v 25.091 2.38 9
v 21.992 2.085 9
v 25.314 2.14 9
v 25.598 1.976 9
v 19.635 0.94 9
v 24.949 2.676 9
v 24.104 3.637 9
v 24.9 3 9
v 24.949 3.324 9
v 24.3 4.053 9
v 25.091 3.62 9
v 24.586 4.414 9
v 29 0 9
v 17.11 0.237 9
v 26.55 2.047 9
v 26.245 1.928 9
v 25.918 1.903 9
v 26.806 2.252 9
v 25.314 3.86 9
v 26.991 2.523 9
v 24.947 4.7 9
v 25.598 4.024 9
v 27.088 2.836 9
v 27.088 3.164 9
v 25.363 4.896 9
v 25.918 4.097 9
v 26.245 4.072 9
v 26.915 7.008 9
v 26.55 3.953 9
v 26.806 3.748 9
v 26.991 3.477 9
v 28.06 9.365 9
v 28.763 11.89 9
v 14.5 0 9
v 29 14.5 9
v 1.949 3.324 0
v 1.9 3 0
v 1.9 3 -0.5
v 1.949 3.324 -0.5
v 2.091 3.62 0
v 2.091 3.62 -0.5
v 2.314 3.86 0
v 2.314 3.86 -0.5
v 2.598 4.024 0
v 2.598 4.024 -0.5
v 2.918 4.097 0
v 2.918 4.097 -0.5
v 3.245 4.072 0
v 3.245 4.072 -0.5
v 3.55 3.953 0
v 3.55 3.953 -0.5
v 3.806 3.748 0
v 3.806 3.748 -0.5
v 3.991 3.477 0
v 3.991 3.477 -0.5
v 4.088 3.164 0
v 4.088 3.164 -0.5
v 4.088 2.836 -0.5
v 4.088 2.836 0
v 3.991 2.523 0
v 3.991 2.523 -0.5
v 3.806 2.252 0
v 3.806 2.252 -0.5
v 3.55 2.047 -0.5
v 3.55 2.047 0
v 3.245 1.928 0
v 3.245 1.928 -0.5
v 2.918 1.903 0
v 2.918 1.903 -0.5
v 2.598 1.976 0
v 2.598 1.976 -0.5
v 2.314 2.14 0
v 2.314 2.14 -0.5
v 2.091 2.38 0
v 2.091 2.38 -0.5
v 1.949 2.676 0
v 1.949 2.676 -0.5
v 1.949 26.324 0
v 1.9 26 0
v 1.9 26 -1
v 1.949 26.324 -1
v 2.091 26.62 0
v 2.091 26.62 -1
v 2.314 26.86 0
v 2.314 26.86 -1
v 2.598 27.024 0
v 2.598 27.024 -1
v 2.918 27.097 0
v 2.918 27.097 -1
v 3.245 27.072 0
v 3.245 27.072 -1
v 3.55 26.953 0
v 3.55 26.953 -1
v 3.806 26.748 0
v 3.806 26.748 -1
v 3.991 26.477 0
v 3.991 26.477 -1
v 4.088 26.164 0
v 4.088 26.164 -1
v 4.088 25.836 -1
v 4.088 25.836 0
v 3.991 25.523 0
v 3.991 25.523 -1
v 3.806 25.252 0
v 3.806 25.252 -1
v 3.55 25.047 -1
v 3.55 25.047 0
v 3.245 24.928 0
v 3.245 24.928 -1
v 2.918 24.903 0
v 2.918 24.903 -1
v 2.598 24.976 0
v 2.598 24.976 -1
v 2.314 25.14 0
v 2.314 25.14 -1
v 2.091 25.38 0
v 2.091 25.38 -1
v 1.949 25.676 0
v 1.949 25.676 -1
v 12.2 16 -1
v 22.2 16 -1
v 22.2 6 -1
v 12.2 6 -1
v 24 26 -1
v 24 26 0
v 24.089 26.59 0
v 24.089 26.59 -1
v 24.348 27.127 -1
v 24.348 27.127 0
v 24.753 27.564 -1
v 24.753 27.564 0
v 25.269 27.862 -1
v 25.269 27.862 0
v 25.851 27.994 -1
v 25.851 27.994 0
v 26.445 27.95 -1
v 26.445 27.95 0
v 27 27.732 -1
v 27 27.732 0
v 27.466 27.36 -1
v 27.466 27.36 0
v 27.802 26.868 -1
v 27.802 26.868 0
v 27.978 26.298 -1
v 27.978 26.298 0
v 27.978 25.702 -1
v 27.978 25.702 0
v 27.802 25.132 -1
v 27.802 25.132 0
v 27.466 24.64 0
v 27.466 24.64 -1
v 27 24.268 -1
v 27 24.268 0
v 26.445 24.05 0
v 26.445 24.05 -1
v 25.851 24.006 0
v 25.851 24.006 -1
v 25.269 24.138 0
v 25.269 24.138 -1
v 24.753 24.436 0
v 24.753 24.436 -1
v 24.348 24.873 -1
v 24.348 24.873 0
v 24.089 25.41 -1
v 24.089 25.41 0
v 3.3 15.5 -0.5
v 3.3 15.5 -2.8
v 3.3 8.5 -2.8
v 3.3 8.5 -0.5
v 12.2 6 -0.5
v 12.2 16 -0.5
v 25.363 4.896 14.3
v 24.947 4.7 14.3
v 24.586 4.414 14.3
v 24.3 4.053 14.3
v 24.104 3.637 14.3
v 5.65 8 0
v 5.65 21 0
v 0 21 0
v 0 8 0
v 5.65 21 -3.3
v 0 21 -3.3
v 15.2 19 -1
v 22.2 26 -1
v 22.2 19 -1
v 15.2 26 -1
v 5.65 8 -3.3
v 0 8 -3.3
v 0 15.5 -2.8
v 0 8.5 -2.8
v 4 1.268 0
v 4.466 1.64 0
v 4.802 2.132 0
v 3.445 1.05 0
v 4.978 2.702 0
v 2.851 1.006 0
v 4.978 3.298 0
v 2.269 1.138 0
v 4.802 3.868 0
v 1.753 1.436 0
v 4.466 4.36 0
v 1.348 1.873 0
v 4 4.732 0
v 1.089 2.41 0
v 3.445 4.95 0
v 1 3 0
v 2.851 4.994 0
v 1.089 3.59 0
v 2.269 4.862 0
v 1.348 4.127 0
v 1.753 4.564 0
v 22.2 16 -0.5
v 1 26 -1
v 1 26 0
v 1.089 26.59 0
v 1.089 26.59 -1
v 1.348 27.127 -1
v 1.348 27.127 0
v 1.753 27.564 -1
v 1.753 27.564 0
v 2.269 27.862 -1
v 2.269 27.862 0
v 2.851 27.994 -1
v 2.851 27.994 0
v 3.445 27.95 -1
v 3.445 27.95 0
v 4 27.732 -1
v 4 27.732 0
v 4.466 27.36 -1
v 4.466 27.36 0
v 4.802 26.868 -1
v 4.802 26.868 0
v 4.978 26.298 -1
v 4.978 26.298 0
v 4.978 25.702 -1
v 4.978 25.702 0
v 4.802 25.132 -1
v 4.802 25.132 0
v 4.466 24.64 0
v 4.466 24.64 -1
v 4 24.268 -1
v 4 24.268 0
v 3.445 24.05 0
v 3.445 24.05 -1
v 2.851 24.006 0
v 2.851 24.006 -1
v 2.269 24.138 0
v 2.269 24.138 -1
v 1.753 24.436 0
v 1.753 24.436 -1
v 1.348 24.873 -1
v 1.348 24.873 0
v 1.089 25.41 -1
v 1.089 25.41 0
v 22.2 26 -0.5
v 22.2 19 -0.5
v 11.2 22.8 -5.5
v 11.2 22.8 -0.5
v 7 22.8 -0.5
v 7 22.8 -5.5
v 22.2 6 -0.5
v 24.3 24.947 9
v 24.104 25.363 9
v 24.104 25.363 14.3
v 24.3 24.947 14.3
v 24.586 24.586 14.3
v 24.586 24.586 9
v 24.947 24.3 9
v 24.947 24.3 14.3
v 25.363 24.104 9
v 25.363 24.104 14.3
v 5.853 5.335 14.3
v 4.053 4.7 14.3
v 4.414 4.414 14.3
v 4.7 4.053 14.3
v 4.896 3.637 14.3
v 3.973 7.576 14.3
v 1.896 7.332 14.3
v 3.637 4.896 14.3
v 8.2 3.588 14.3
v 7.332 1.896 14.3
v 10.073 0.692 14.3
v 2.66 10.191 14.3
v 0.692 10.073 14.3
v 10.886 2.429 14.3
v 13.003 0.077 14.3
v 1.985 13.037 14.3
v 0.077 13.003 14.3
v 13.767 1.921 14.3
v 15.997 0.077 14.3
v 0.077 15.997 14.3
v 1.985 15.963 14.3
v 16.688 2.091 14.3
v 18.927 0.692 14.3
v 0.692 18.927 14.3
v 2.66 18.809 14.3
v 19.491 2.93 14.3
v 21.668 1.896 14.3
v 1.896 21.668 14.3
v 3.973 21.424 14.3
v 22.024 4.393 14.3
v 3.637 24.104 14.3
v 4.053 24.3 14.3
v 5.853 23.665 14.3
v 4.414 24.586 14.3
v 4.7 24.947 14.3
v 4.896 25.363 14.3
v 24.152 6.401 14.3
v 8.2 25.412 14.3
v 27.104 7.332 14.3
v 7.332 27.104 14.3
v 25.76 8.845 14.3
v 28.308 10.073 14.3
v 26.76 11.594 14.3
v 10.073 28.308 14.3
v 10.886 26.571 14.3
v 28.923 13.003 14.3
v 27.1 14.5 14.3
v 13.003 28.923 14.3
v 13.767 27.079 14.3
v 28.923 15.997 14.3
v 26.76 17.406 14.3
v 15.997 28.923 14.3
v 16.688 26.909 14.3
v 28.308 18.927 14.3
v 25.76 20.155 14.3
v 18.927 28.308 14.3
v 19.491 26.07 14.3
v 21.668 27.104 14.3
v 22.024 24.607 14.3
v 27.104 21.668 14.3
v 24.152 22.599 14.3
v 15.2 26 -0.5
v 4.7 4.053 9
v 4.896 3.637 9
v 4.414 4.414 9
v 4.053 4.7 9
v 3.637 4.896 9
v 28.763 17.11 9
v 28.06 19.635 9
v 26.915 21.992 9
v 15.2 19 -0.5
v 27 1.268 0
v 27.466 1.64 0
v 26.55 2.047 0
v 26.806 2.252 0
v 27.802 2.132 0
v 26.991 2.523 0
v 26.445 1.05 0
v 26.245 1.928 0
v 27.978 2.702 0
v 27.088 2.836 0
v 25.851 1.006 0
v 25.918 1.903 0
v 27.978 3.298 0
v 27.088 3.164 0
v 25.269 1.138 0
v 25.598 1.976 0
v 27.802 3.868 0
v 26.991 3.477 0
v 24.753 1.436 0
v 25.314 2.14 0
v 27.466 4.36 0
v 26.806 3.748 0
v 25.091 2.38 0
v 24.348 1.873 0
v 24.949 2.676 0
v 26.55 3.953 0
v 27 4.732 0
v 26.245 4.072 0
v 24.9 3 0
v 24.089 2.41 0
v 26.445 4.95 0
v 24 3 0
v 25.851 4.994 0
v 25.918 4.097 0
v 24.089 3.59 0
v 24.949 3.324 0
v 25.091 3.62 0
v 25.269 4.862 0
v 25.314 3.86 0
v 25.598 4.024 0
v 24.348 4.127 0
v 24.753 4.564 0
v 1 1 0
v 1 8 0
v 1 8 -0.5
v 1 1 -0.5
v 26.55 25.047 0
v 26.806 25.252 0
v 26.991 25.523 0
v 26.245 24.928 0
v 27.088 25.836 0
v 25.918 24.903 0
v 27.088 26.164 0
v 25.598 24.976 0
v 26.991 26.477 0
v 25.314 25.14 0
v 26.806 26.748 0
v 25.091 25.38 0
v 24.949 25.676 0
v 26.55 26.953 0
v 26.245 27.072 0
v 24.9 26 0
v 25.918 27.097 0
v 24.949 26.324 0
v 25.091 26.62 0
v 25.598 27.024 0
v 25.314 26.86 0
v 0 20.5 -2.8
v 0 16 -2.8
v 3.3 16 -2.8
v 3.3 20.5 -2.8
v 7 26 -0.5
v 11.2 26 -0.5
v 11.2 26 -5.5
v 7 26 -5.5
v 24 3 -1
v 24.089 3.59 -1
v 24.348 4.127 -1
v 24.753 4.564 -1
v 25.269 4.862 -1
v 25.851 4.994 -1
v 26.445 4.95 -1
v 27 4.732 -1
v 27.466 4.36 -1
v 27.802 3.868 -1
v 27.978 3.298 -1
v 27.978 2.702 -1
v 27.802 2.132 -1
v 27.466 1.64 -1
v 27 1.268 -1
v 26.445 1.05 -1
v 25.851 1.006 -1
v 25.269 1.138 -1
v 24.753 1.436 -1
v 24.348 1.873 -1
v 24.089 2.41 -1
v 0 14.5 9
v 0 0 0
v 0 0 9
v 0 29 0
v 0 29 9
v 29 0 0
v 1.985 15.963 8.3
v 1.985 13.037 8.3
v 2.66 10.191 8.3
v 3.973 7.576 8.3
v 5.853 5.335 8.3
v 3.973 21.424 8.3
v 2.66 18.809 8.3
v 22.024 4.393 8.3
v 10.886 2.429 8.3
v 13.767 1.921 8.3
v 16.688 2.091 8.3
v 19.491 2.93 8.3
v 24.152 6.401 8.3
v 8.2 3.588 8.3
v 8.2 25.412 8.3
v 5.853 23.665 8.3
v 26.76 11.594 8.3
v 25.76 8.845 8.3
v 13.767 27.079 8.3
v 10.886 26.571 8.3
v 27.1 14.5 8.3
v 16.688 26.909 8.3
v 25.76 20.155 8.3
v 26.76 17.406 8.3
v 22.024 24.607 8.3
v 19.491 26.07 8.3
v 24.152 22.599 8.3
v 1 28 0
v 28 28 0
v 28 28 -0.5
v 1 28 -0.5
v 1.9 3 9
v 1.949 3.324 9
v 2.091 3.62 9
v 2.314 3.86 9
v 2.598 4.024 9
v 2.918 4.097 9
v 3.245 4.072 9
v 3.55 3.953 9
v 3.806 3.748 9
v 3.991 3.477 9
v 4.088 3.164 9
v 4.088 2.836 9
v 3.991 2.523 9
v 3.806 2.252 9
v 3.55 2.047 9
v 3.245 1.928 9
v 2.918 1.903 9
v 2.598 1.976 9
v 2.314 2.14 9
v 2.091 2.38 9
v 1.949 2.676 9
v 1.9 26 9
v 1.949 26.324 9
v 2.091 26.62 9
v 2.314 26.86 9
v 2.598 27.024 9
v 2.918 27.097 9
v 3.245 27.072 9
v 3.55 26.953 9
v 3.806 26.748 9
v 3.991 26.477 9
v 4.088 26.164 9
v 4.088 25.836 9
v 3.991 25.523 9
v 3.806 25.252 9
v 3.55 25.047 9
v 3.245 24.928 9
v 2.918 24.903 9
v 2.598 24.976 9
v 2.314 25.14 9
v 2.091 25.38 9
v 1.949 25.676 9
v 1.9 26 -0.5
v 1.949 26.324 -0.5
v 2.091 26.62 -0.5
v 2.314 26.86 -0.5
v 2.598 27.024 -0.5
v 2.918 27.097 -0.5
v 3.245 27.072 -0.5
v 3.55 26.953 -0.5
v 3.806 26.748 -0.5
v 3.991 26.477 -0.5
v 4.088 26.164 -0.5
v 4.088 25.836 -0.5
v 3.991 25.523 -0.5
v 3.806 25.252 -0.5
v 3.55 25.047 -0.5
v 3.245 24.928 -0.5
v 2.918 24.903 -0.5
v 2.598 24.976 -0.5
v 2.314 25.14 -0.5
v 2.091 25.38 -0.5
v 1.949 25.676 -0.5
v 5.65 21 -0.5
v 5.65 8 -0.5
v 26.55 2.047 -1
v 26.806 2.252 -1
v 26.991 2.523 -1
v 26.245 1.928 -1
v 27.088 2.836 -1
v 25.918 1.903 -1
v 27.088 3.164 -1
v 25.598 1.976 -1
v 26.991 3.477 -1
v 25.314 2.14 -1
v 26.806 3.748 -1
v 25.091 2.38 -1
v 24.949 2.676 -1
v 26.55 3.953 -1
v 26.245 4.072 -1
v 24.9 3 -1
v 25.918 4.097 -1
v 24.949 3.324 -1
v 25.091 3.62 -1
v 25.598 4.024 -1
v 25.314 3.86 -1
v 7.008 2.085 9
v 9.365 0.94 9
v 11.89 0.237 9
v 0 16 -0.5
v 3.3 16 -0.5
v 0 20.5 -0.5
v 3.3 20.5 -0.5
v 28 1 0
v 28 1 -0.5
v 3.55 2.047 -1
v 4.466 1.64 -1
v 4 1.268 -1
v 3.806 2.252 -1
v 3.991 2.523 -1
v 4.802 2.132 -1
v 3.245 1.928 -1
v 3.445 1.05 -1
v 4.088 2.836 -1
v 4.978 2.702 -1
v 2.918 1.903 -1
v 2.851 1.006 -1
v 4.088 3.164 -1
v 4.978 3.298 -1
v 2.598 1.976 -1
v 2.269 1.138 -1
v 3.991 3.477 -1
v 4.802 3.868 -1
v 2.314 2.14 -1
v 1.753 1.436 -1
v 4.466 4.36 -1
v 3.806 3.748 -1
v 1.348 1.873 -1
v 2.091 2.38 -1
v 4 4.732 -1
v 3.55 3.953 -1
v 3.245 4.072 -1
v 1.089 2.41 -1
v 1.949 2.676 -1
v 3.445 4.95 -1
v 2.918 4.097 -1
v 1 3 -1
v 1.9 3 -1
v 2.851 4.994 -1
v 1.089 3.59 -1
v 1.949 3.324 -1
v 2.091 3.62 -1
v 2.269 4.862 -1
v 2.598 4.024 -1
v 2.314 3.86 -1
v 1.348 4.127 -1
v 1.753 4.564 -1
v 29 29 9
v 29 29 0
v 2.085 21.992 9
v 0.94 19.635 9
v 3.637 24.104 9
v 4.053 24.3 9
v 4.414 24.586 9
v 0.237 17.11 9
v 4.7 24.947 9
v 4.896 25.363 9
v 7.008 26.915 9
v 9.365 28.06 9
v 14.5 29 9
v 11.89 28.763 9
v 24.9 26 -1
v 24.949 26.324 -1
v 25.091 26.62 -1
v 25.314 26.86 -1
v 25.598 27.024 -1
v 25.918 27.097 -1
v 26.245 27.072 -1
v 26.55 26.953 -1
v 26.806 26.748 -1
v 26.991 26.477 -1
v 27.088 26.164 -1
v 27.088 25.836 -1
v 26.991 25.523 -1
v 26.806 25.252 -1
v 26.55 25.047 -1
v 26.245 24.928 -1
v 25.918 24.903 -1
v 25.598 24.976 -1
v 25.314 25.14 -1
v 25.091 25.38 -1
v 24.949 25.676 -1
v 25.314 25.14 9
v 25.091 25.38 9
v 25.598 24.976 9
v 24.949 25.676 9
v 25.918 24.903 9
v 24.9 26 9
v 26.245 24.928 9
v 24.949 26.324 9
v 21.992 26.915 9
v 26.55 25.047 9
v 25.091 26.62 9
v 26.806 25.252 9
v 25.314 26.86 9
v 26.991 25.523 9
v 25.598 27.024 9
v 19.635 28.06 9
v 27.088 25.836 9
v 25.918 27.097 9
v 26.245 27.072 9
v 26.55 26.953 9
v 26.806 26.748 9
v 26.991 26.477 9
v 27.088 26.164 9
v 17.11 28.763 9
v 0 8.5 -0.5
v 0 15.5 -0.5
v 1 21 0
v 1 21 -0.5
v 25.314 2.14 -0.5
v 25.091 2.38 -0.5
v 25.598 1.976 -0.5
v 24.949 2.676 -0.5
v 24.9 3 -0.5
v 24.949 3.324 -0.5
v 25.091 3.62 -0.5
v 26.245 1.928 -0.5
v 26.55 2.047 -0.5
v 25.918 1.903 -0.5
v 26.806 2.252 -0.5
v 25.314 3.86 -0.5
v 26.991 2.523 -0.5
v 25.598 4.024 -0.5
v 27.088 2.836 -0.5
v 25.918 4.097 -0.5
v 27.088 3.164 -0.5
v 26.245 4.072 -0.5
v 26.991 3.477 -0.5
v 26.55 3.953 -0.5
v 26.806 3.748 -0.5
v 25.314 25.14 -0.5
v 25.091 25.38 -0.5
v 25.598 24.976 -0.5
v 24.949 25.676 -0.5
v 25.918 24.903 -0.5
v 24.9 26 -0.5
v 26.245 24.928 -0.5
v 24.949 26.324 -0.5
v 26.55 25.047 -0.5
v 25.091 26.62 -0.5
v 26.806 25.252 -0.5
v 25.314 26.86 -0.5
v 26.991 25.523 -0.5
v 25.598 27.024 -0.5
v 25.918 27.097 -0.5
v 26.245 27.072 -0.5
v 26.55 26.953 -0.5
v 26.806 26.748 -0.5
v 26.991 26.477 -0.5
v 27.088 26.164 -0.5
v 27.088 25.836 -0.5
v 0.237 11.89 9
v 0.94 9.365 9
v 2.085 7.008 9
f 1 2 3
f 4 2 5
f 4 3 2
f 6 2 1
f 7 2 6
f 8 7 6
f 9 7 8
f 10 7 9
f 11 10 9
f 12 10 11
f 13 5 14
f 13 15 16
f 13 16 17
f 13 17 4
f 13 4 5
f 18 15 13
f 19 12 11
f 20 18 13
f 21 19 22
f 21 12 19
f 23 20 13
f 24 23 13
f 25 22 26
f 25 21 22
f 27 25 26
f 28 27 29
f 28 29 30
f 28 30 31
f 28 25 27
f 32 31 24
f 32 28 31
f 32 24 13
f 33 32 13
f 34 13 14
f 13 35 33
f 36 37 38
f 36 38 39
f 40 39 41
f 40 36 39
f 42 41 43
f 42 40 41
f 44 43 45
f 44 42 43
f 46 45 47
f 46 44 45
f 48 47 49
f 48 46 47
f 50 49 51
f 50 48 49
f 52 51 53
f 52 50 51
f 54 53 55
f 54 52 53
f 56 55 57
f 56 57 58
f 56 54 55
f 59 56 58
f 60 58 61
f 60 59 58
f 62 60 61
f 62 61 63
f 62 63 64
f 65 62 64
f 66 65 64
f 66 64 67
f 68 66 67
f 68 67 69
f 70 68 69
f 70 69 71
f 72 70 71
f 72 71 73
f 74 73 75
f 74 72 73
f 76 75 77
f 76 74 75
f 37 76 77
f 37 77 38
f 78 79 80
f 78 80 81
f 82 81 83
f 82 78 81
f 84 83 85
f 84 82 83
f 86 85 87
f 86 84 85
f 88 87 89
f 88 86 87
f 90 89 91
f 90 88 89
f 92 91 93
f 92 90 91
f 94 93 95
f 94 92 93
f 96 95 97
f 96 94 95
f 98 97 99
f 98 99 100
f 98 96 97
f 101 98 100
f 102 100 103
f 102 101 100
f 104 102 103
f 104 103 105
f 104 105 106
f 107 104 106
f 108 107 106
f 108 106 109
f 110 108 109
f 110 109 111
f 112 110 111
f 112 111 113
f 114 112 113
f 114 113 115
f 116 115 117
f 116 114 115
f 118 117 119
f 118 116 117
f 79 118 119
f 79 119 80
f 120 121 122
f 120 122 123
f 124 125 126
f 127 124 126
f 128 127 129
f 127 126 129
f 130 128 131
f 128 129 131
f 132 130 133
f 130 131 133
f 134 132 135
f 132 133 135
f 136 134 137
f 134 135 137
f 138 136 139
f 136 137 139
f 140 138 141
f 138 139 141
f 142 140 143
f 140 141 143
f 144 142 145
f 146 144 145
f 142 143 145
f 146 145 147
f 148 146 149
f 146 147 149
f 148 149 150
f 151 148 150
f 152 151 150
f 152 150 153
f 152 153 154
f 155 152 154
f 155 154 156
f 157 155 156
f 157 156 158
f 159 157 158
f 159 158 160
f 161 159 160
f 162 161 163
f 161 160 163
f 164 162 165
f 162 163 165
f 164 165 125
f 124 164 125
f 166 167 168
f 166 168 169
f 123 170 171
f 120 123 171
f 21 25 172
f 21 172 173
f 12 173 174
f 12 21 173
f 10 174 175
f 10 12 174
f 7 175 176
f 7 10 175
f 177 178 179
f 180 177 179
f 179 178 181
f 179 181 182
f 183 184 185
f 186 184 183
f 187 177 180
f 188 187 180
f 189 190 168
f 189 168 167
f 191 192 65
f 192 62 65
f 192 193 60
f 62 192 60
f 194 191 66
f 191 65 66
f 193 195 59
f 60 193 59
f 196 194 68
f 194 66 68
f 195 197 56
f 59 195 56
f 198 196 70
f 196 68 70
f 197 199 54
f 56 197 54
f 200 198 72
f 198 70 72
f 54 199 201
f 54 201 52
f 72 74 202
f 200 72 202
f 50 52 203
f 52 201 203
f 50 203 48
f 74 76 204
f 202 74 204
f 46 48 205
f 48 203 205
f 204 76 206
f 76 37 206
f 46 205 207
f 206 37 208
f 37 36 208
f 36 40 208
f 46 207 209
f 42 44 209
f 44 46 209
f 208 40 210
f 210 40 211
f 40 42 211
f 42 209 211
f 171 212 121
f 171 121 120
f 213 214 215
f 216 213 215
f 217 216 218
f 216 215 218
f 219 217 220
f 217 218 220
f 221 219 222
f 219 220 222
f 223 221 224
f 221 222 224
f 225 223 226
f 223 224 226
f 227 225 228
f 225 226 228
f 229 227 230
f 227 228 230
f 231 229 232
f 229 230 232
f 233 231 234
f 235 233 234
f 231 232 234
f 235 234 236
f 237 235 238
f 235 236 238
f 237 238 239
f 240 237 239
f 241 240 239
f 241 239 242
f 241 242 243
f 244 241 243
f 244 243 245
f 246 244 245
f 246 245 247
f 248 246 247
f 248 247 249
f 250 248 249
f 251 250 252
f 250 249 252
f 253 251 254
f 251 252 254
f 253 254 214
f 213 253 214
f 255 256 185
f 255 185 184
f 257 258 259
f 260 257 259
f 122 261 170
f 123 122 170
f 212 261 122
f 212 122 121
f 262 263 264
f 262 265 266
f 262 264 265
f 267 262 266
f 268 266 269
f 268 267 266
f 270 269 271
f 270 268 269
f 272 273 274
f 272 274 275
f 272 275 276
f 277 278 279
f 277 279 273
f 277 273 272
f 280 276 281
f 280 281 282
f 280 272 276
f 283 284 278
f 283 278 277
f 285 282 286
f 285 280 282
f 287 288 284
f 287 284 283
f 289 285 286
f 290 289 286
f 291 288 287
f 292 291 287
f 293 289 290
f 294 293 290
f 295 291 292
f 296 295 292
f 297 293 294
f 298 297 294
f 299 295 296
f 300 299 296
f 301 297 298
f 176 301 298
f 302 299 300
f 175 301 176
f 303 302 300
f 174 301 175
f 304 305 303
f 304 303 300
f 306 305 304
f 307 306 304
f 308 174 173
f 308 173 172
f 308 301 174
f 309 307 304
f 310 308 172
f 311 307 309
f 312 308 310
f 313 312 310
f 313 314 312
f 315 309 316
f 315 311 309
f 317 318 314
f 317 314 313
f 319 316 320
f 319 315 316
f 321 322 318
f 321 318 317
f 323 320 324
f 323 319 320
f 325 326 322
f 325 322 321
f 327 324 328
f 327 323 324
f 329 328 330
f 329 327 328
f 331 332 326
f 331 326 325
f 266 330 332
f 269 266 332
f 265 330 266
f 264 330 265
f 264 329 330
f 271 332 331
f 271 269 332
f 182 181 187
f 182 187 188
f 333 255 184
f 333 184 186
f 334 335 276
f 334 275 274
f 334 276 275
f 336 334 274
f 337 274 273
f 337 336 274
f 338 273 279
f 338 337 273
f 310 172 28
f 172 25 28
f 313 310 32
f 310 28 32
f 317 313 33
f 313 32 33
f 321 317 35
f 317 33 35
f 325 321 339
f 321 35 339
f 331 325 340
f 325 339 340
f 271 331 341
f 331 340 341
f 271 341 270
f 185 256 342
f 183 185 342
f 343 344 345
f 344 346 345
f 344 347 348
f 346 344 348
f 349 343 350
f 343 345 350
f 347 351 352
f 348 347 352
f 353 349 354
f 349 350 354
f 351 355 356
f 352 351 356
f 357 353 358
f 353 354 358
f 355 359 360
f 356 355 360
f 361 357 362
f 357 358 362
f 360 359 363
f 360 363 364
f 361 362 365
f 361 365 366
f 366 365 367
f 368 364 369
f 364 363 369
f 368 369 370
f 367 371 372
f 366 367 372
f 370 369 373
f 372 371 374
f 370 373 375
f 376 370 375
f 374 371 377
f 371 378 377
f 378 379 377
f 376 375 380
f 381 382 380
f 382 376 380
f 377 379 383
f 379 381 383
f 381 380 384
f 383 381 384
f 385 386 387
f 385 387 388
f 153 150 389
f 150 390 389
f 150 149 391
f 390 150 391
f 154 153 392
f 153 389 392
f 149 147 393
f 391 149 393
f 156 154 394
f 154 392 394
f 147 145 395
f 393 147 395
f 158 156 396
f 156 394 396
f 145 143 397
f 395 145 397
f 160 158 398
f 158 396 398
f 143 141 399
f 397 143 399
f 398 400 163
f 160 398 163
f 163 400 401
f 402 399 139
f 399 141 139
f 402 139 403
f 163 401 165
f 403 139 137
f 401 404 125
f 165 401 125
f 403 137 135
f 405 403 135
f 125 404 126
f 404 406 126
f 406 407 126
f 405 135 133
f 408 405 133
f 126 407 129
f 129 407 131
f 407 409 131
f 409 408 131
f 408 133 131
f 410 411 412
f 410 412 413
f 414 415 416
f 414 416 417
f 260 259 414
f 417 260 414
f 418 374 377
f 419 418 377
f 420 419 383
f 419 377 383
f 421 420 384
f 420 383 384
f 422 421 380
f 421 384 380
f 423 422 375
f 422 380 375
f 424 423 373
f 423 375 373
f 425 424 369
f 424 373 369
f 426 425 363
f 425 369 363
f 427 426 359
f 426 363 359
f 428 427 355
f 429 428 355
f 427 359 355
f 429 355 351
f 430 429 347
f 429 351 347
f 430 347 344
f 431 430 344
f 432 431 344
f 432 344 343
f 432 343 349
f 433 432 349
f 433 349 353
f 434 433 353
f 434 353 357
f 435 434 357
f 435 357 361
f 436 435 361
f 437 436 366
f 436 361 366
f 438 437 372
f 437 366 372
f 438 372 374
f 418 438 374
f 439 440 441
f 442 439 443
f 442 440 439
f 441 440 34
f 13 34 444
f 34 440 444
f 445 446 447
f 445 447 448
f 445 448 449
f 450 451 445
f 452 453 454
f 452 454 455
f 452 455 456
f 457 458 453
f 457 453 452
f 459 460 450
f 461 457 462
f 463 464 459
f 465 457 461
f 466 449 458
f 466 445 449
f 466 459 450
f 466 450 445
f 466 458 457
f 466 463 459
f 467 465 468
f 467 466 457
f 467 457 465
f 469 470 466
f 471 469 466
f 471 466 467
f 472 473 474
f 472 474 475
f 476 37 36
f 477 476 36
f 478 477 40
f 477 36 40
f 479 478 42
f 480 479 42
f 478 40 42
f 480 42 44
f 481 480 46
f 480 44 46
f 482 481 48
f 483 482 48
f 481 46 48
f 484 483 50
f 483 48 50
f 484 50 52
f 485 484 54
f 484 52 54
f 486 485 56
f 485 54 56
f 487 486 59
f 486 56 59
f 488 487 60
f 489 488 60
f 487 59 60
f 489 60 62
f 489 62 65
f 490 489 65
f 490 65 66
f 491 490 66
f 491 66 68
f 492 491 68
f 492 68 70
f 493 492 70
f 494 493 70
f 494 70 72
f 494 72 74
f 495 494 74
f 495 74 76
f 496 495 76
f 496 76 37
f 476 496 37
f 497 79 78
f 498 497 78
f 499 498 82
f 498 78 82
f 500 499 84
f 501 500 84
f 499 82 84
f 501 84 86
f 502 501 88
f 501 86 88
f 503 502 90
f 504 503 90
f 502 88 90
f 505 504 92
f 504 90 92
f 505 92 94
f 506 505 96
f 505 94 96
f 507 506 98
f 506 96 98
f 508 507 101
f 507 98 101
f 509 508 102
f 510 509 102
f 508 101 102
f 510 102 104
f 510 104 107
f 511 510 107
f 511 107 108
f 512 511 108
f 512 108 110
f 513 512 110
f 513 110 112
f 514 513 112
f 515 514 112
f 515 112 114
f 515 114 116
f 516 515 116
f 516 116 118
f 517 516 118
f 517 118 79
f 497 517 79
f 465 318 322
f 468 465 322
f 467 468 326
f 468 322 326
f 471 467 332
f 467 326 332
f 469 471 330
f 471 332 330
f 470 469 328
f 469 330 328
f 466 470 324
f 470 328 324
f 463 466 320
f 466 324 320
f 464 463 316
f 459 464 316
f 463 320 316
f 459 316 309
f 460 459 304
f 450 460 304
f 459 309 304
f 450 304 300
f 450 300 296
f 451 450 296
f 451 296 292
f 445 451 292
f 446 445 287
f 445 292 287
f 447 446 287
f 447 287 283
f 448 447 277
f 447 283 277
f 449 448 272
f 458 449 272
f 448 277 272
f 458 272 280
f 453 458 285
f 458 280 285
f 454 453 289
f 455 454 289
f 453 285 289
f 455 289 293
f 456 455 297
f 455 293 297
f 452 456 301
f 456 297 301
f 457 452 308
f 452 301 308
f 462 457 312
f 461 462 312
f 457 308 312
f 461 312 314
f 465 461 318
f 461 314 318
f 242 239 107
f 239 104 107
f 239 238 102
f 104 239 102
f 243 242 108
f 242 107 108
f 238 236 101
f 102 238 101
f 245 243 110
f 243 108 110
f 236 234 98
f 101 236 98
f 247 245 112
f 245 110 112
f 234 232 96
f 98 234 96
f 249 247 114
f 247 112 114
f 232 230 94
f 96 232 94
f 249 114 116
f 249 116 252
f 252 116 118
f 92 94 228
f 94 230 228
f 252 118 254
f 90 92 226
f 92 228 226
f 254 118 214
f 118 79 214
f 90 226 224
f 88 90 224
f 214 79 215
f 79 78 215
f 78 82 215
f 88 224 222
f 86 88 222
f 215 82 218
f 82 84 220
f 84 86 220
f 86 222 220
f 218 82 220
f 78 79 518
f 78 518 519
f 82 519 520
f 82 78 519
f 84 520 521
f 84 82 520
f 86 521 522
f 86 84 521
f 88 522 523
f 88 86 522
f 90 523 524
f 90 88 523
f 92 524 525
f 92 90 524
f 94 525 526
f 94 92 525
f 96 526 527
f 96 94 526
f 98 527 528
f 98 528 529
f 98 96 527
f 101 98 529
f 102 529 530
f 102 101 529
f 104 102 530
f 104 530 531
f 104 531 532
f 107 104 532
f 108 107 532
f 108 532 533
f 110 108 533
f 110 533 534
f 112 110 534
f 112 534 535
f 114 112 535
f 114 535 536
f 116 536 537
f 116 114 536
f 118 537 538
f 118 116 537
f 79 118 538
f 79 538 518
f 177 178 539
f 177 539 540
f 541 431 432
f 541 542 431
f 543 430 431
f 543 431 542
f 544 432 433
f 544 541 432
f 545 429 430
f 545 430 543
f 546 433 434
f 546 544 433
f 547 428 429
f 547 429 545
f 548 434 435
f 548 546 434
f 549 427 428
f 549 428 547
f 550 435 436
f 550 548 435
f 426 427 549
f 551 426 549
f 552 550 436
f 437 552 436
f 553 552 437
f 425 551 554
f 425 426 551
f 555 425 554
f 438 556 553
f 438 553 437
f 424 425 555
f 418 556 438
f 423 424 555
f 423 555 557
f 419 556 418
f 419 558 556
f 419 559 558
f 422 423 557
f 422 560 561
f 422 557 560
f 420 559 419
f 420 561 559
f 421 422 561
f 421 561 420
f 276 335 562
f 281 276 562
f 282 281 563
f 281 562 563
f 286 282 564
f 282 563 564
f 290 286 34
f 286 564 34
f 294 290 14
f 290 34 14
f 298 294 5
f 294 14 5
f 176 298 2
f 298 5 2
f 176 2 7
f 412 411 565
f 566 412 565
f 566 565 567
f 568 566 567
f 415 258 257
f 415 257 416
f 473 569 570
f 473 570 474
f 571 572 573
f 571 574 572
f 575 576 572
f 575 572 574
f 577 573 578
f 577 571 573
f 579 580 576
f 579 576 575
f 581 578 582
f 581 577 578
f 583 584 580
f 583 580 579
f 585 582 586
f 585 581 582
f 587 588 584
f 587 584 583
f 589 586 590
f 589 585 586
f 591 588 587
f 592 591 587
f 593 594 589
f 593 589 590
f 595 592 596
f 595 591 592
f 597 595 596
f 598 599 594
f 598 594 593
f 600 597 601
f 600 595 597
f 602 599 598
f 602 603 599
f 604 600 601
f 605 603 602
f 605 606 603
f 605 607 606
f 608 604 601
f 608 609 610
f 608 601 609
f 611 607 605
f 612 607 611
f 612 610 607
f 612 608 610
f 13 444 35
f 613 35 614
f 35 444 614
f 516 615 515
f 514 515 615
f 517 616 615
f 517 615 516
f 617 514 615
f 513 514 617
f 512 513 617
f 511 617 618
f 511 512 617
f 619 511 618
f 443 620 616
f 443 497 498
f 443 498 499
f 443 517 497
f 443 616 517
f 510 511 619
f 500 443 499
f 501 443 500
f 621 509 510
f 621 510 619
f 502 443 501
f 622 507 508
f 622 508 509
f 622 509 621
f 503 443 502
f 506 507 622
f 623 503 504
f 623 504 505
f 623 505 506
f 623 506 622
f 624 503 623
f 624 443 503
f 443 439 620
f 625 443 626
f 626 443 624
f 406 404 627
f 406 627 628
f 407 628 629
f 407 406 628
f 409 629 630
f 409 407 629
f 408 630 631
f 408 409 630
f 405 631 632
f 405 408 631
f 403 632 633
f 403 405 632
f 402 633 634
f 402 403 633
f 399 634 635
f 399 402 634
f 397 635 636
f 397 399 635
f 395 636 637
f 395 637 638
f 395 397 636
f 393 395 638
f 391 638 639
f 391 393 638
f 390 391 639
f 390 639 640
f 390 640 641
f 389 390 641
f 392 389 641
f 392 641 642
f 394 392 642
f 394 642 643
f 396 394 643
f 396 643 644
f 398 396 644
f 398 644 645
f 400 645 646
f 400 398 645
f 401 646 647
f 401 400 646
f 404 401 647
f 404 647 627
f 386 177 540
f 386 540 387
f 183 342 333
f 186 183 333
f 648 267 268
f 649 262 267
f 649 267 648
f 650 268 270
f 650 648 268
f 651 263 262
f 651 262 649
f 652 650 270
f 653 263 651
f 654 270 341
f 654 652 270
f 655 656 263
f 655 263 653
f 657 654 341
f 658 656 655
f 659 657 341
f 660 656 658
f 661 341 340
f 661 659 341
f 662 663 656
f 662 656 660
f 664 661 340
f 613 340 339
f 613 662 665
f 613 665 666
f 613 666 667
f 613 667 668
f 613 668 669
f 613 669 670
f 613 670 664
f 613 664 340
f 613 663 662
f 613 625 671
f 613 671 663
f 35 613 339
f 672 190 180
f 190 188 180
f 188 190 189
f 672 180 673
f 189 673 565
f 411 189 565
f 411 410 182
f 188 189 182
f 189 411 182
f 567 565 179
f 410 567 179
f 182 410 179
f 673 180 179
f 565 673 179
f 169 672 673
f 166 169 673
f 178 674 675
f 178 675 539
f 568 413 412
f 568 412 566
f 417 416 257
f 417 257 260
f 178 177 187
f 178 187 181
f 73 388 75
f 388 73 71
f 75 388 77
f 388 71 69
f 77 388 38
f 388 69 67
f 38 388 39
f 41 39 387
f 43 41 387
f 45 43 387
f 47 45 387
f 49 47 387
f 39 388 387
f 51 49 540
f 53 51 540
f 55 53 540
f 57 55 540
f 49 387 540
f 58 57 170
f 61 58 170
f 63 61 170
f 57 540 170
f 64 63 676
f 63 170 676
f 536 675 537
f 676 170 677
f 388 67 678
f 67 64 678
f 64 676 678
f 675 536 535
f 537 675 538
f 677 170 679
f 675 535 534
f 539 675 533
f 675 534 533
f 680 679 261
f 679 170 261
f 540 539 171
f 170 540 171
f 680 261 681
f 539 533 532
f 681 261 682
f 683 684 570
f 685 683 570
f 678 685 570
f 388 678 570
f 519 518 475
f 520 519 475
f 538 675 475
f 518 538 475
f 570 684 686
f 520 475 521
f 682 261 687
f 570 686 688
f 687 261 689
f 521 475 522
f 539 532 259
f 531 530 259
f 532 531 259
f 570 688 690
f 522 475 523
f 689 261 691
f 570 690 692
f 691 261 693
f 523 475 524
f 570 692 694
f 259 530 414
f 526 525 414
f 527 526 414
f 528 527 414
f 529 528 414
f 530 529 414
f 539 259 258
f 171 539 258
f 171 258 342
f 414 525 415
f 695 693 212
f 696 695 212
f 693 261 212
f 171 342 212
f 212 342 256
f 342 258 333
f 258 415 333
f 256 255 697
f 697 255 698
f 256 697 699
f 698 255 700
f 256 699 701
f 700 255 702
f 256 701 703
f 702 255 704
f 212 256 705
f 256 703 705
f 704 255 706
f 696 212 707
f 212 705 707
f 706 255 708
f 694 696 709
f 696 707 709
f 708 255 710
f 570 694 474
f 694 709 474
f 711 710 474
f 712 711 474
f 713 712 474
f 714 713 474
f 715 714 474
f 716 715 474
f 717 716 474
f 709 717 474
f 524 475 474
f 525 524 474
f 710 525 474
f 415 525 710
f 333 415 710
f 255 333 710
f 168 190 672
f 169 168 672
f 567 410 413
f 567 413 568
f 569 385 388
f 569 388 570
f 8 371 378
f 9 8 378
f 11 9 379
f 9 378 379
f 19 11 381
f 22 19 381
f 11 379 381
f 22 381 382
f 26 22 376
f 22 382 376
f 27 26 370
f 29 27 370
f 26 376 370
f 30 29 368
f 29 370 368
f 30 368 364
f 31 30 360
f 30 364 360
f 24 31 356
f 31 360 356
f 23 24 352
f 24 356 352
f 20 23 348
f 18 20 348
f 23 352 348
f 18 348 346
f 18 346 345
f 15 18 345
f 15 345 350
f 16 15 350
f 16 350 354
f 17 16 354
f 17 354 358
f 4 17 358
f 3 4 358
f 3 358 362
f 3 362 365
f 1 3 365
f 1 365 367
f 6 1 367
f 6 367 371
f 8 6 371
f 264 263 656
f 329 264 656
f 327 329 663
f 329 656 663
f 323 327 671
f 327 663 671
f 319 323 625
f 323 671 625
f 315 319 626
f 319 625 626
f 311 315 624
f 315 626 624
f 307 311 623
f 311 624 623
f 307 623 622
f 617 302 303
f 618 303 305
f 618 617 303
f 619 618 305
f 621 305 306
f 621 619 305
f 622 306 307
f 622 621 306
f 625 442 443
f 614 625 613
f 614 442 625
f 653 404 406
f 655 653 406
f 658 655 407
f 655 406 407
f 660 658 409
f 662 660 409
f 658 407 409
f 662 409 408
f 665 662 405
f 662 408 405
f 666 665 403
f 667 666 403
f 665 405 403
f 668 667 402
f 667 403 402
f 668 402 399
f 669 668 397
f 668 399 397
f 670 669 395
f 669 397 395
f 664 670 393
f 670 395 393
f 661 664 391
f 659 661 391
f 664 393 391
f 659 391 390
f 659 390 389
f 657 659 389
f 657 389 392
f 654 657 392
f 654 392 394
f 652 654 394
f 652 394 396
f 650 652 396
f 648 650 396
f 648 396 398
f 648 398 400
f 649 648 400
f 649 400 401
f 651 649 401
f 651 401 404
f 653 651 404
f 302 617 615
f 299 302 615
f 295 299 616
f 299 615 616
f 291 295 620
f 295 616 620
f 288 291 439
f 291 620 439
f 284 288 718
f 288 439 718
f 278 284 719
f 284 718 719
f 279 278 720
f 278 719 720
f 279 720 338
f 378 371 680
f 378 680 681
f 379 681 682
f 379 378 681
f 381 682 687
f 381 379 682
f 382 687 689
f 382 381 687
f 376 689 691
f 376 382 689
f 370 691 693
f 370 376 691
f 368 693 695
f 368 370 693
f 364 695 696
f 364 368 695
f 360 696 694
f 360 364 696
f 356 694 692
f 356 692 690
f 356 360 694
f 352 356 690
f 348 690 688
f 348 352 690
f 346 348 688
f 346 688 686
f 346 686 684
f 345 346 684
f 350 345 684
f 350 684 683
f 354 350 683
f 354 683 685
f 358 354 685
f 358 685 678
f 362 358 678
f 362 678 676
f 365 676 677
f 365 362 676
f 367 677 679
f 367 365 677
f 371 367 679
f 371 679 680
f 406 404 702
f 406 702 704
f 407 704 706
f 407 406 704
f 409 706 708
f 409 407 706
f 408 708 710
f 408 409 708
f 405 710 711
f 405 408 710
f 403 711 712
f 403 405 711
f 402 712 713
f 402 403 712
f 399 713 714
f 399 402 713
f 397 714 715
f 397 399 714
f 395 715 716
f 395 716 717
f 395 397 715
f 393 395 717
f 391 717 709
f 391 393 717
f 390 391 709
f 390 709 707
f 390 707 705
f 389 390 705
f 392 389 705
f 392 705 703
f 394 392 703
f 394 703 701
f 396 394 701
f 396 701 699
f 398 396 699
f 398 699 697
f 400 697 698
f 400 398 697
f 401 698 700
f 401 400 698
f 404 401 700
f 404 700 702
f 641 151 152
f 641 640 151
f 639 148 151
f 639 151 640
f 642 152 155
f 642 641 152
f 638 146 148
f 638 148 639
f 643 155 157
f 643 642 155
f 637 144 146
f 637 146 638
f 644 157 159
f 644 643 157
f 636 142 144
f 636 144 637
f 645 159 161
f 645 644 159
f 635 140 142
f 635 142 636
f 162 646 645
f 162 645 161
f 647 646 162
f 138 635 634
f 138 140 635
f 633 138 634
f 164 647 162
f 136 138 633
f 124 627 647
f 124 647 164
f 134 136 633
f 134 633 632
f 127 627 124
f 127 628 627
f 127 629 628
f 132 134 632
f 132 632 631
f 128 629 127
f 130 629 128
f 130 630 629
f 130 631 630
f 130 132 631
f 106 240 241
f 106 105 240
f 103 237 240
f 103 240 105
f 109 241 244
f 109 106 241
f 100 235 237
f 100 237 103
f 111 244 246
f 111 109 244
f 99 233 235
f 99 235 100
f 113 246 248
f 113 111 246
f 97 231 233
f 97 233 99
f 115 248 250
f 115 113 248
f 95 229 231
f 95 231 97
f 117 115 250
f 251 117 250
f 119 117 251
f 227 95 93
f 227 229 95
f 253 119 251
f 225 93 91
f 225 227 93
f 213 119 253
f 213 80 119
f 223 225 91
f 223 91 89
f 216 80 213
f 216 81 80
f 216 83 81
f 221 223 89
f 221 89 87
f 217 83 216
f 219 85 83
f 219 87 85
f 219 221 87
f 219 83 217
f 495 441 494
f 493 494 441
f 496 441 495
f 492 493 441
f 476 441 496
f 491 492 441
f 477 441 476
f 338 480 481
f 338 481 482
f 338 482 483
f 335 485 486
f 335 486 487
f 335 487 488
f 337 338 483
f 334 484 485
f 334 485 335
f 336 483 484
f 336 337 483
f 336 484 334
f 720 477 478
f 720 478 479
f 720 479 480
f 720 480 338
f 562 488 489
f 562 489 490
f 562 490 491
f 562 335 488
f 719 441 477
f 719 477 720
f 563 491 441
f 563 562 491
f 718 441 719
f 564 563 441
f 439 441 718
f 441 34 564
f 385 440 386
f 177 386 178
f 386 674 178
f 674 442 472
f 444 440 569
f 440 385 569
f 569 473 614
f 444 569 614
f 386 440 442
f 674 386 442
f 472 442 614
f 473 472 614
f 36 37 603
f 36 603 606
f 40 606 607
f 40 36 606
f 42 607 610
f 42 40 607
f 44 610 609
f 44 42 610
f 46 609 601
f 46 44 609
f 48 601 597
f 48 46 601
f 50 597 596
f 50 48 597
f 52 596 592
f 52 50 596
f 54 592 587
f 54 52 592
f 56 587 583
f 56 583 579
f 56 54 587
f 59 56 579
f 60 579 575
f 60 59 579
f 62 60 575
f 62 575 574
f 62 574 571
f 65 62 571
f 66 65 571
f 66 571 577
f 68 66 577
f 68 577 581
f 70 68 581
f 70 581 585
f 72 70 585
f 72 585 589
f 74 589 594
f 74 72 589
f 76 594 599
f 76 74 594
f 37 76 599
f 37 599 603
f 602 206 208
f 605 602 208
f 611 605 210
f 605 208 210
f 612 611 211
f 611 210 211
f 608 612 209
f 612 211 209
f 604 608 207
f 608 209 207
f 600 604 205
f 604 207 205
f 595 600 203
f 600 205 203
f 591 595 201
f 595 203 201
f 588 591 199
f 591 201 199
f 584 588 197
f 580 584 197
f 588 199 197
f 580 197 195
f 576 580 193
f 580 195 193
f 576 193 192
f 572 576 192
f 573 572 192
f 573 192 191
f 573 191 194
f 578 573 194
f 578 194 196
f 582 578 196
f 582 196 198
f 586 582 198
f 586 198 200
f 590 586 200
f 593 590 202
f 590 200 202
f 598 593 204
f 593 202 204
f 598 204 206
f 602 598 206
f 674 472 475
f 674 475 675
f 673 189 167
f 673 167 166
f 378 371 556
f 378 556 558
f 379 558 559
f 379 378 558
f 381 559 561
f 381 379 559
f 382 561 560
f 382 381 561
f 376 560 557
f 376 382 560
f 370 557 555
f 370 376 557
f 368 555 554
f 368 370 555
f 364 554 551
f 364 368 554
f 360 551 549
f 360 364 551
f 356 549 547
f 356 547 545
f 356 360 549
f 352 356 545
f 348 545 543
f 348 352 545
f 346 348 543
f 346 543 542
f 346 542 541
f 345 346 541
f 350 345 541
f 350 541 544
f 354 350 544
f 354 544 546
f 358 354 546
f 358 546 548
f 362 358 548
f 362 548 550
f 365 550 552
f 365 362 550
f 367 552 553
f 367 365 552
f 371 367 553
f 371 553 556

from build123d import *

# Parameters (mm, degrees)
SKETCH1_W             = 29
SKETCH1_H             = 29
BOSS_EXTRUDE1_DEPTH   = 9
SKETCH3_R             = 14.5
BOSS_EXTRUDE2_DEPTH   = 5.3
SKETCH4_R             = 12.6
CUT_EXTRUDE1_DEPTH    = 6
SKETCH5_R             = 1.1
CUT_EXTRUDE2_DEPTH    = 15.3
SKETCH6_R             = 2
CUT_EXTRUDE3_DEPTH    = 6.3
SKETCH7_R             = 1.1
BOSS_EXTRUDE3_DEPTH   = 0.5
SKETCH8_R             = 2
SKETCH8_R_2           = 1.1
BOSS_EXTRUDE4_DEPTH   = 1
BOSS_EXTRUDE4_2_DEPTH = 1
BOSS_EXTRUDE4_3_DEPTH = 1
BOSS_EXTRUDE4_4_DEPTH = 1
SKETCH9_W             = 5.65
SKETCH9_H             = 13
BOSS_EXTRUDE5_DEPTH   = 3.3
SKETCH10_W            = 2.3
SKETCH10_H            = 4.5
SKETCH10_H_2          = 7
CUT_EXTRUDE4_DEPTH    = 3.3
SKETCH11_W            = 4.2
SKETCH11_H            = 3.2
BOSS_EXTRUDE6_DEPTH   = 5
SKETCH12_W            = 7
SKETCH12_H            = 7
SKETCH12_W_2          = 10
SKETCH12_H_2          = 10
BOSS_EXTRUDE7_DEPTH   = 0.5


with BuildPart() as part:
    # Sketch1 → Boss-Extrude1 (new body)
    with BuildSketch(Plane.XY):
        with Locations((14.5, 14.5)):
            Rectangle(SKETCH1_W, SKETCH1_H)
    extrude(amount=BOSS_EXTRUDE1_DEPTH)

    # Sketch3 → Boss-Extrude2 (add)
    with BuildSketch(Plane.XY.offset(9)):
        with Locations((14.5, 14.5)):
            Circle(SKETCH3_R)
    extrude(amount=BOSS_EXTRUDE2_DEPTH)

    # Sketch4 → Cut-Extrude1 (cut)
    with BuildSketch(Plane.XY.offset(14.3)):
        with Locations((14.5, 14.5)):
            Circle(SKETCH4_R)
    extrude(amount=-CUT_EXTRUDE1_DEPTH, mode=Mode.SUBTRACT)

    # Sketch5 → Cut-Extrude2 (cut, through all)
    with BuildSketch(Plane(origin=(0, 0, 0), x_dir=(-1, 0, 0), z_dir=(0, 0, -1))):
        with Locations((-26, 26)):
            Circle(SKETCH5_R)
        with Locations((-3, 26)):
            Circle(SKETCH5_R)
        with Locations((-3, 3)):
            Circle(SKETCH5_R)
        with Locations((-26, 3)):
            Circle(SKETCH5_R)
    extrude(amount=-CUT_EXTRUDE2_DEPTH, mode=Mode.SUBTRACT)

    # Sketch6 → Cut-Extrude3 (cut, through all)
    with BuildSketch(Plane.XY.offset(9)):
        with Locations((3, 26)):
            Circle(SKETCH6_R)
        with Locations((26, 26)):
            Circle(SKETCH6_R)
        with Locations((26, 3)):
            Circle(SKETCH6_R)
        with Locations((3, 3)):
            Circle(SKETCH6_R)
    extrude(amount=CUT_EXTRUDE3_DEPTH, mode=Mode.SUBTRACT)

    # Sketch7 → Boss-Extrude3 (add)
    with BuildSketch(Plane(origin=(0, 0, 0), x_dir=(-1, 0, 0), z_dir=(0, 0, -1))):
        Polygon((-28, 28), (-1, 28), (-1, 21), (-5.65, 21), (-5.65, 8), (-1, 8), (-1, 1), (-28, 1), align=None)
        with Locations((-26, 3)):
            Circle(SKETCH7_R, mode=Mode.SUBTRACT)
        with Locations((-3, 3)):
            Circle(SKETCH7_R, mode=Mode.SUBTRACT)
        with Locations((-3, 26)):
            Circle(SKETCH7_R, mode=Mode.SUBTRACT)
        with Locations((-26, 26)):
            Circle(SKETCH7_R, mode=Mode.SUBTRACT)
    extrude(amount=BOSS_EXTRUDE3_DEPTH)

    # Sketch11 → Boss-Extrude6 (add)
    with BuildSketch(Plane(origin=(0, 0, -0.5), x_dir=(-1, 0, 0), z_dir=(0, 0, -1))):
        with Locations((-9.1, 24.4)):
            Rectangle(SKETCH11_W, SKETCH11_H)
    extrude(amount=BOSS_EXTRUDE6_DEPTH)

    # Sketch12 → Boss-Extrude7 (add)
    with BuildSketch(Plane(origin=(0, 0, -0.5), x_dir=(-1, 0, 0), z_dir=(0, 0, -1))):
        with Locations((-18.7, 22.5)):
            Rectangle(SKETCH12_W, SKETCH12_H)
        with Locations((-17.2, 11)):
            Rectangle(SKETCH12_W_2, SKETCH12_H_2)
    extrude(amount=BOSS_EXTRUDE7_DEPTH)


with BuildPart() as body_2:
    # Sketch8 → Boss-Extrude4 (new body)
    with BuildSketch(Plane(origin=(0, 0, 0), x_dir=(-1, 0, 0), z_dir=(0, 0, -1))):
        with Locations((-26, 26)):
            Circle(SKETCH8_R)
        with Locations((-26, 26)):
            Circle(SKETCH8_R_2, mode=Mode.SUBTRACT)
    extrude(amount=BOSS_EXTRUDE4_DEPTH)


with BuildPart() as body_3:
    # Sketch8 → Boss-Extrude4 2 (new body)
    with BuildSketch(Plane(origin=(0, 0, 0), x_dir=(-1, 0, 0), z_dir=(0, 0, -1))):
        with Locations((-3, 26)):
            Circle(SKETCH8_R)
        with Locations((-3, 26)):
            Circle(SKETCH8_R_2, mode=Mode.SUBTRACT)
    extrude(amount=BOSS_EXTRUDE4_2_DEPTH)


with BuildPart() as body_4:
    # Sketch8 → Boss-Extrude4 3 (new body)
    with BuildSketch(Plane(origin=(0, 0, 0), x_dir=(-1, 0, 0), z_dir=(0, 0, -1))):
        with Locations((-26, 3)):
            Circle(SKETCH8_R)
        with Locations((-26, 3)):
            Circle(SKETCH8_R_2, mode=Mode.SUBTRACT)
    extrude(amount=BOSS_EXTRUDE4_3_DEPTH)


with BuildPart() as body_5:
    # Sketch8 → Boss-Extrude4 4 (new body)
    with BuildSketch(Plane(origin=(0, 0, 0), x_dir=(-1, 0, 0), z_dir=(0, 0, -1))):
        with Locations((-3, 3)):
            Circle(SKETCH8_R)
        with Locations((-3, 3)):
            Circle(SKETCH8_R_2, mode=Mode.SUBTRACT)
    extrude(amount=BOSS_EXTRUDE4_4_DEPTH)


with BuildPart() as body_6:
    # Sketch9 → Boss-Extrude5 (new body)
    with BuildSketch(Plane(origin=(0, 0, 0), x_dir=(-1, 0, 0), z_dir=(0, 0, -1))):
        with Locations((-2.825, 14.5)):
            Rectangle(SKETCH9_W, SKETCH9_H)
    extrude(amount=BOSS_EXTRUDE5_DEPTH)

    # Sketch10 → Cut-Extrude4 (cut)
    with BuildSketch(Plane.ZY):
        with Locations((-1.65, 18.25)):
            Rectangle(SKETCH10_W, SKETCH10_H)
        with Locations((-1.65, 12)):
            Rectangle(SKETCH10_W, SKETCH10_H_2)
    extrude(amount=-CUT_EXTRUDE4_DEPTH, mode=Mode.SUBTRACT)


solid = Compound([part.part, body_2.part, body_3.part, body_4.part, body_5.part, body_6.part])
